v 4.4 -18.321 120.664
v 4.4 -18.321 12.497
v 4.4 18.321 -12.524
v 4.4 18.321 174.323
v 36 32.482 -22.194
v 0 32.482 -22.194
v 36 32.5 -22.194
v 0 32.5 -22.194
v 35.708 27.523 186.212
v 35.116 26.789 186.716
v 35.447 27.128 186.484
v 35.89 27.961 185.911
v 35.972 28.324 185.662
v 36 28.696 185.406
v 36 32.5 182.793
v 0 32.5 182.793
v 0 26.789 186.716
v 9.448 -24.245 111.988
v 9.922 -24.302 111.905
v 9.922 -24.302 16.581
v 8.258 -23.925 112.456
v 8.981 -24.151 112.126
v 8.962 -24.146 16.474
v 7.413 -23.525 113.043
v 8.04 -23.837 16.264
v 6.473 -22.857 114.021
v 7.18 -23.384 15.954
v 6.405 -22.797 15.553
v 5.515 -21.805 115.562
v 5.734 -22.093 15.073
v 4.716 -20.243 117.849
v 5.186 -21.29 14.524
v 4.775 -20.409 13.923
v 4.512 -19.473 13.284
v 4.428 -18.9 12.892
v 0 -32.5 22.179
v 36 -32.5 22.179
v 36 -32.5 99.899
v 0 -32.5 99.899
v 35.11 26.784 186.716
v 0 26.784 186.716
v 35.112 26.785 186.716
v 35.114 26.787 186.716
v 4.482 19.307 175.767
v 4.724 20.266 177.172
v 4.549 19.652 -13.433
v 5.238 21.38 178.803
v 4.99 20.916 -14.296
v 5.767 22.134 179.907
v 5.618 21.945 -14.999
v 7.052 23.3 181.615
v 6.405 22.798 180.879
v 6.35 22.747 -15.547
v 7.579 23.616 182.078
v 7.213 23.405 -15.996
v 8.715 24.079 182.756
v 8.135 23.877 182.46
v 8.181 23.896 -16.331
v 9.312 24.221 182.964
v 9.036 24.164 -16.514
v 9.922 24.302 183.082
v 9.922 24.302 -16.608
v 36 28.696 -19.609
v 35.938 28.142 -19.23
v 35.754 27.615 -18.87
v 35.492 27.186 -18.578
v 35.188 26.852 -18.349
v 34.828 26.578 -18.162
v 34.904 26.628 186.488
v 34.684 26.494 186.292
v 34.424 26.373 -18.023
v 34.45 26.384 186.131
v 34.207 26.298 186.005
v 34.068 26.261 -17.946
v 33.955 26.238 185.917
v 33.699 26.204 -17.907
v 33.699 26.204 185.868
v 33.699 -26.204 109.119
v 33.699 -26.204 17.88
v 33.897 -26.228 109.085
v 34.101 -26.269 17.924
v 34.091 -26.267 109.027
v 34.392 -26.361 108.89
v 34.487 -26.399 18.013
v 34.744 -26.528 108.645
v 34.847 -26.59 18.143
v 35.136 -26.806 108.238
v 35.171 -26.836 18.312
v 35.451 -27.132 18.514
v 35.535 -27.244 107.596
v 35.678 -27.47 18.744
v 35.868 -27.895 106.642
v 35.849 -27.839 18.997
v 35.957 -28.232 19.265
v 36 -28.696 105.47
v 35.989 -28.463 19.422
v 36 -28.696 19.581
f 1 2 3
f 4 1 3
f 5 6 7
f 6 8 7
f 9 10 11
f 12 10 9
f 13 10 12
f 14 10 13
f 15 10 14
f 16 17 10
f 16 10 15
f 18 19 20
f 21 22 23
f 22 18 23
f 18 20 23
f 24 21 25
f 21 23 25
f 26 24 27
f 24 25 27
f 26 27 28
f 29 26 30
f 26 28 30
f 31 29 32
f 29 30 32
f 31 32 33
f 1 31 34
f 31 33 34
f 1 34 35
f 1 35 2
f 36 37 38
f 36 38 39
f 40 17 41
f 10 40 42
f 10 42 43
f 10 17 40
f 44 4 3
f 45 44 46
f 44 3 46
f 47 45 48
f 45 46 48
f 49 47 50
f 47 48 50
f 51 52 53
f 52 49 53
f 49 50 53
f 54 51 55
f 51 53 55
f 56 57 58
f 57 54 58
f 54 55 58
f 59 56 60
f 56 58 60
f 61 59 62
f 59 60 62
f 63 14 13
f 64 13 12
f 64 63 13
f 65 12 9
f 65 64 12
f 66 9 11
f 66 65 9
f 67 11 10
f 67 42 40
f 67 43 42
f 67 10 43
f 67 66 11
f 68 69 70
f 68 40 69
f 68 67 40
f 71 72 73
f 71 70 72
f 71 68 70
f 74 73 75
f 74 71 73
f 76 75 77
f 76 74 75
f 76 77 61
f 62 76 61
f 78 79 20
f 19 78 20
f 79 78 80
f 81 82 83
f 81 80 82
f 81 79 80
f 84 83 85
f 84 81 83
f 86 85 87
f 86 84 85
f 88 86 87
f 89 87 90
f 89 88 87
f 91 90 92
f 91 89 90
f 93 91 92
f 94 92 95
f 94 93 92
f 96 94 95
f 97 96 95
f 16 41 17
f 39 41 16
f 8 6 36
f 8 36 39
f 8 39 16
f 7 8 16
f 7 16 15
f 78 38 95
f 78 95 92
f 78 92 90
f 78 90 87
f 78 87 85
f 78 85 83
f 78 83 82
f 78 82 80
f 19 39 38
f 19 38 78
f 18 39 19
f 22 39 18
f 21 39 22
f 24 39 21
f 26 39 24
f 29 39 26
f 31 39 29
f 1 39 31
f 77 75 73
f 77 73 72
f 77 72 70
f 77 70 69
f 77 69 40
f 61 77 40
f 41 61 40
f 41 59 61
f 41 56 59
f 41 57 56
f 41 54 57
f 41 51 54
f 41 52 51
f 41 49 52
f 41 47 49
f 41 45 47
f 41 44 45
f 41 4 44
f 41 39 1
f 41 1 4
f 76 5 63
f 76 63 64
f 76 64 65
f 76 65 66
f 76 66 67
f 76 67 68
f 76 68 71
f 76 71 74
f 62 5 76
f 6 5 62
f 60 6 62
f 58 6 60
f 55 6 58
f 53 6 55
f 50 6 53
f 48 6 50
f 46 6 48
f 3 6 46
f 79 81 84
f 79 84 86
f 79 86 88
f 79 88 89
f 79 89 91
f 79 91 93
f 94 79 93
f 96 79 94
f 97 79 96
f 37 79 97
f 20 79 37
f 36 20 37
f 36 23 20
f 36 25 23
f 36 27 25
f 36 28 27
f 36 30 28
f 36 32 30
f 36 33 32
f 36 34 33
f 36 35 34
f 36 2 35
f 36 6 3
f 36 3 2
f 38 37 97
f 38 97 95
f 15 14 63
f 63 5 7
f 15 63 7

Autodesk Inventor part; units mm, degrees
ref_plane "Начальная плоскость" through (0, 0, -22.1942) normal (0, 0, 1) x (1, 0, 0)
ref_plane "Конечная плоскость" through (0, 0, 186.7165) normal (0, 0, 1) x (1, 0, 0)
sketch "Эскиз" plane through (0, 0, 0) normal (0, 0, 1) x (1, 0, 0)
  line L0 (36, -32.5) -> (0, -32.5)
  line L1 (36, -32.5) -> (36, -28.696)
  line L2 (33.6994, -26.2039) -> (9.9215, -24.3017)
  line L3 (4.4, -18.3208) -> (4.4, 18.3208)
  line L4 (33.6994, 26.2039) -> (9.9215, 24.3017)
  line L5 (36, 28.696) -> (36, 32.5)
  line L6 (0, 32.5) -> (36, 32.5)
  line L7 (0, -32.5) -> (0, 32.5)
  arc A0 (4.4, -18.3208) -> (9.9215, -24.3017) centre (10.4, -18.3208) ccw
  arc A1 (9.9215, 24.3017) -> (4.4, 18.3208) centre (10.4, 18.3208) ccw
  arc A2 (36, -28.696) -> (33.6994, -26.2039) centre (33.5, -28.696) ccw
  arc A3 (33.6994, 26.2039) -> (36, 28.696) centre (33.5, 28.696) ccw
  line L8 (0, 45.5) -> (0, -45.5) construction
  line L9 (-7.2974, 0) -> (43.7847, 0) construction
  point P0 (36, -26.388)
  point P1 (4.4, -23.86)
  point P2 (4.4, 23.86)
  point P3 (36, 26.388)
  dimension "d3" = 36
  dimension "d5" = 4.4
  dimension "d7" = 65
  dimension "d9" = 8.64
  dimension "d11" = 8.64
  dimension "d13" = 6.112
  dimension "d15" = 6.112
  dimension "d22" = 6
  dimension "d23" = 2.5
  dimension "d24" = 32.5
  dimension "d25" = 0
extrude "Тело" add sketch "Эскиз" along normal up to surface (208.9107 mm away) from surface at -22.1942
sketch "Sketch3" plane through (0, 0, 0) normal (0, 0, 1) x (1, 0, 0)
  line L0 (0, 0) -> (10, 0)
ref_plane "Work Plane7" through (0, 0, 0) normal (0, -1, 0) x (1, 0, 0)
sketch "Sketch4" plane through (0, 0, 0) normal (0, -1, 0) x (1, 0, 0)
  line L0 (-2, -22.1942) -> (12, -22.1942)
  line L1 (-2, 186.7165) -> (12, 186.7165)
  dimension "d29" = 208.9107
ref_plane "РабПлоскость8" through (36, 0, 205.1172) normal (0, 0.5662, 0.8243) x (1, 0, 0)
split "Разделение1" plane through (36, 0, 205.1172) removes the side toward (0, 0.5662, 0.8243)
ref_plane "РабПлоскость9" through (0, -68.6864, 46.906) normal (0, -0.8258, 0.5639) x (1, 0, 0)
split "Разделение2" plane through (0, -68.6864, 46.906) removes the side toward (0, -0.8258, 0.5639)
ref_plane "РабПлоскость10" through (36, 299.1334, -204.2778) normal (0, -0.5639, -0.8258) x (1, 0, 0)
split "Разделение3" plane through (36, 299.1334, -204.2778) removes the side toward (0, -0.5639, -0.8258)
equation "\"d3\" = b"
equation "\"d5\" = t1"
equation "\"d7\" = ParH"
equation "\"d9\" = msp_x1 + t2"
equation "\"d11\" = msp_x1 + t2"
equation "\"d13\" = -msp_x2 + t2"
equation "\"d15\" = -msp_x2 + t2"
equation "\"d22\" = R"
equation "\"d23\" = R1"
equation "\"d24\" = 0.5 * d7"
equation "\"d16\" = G_L"
equation "\"R1\" = 2.5"
equation "\"R\" = 6"
equation "\"t1\" = 4.4"
equation "\"t2\" = 7.2"
equation "\"ParH\" = 65"
equation "\"b\" = 36"
equation "\"msp_x1\" = 0.04 * b"
equation "\"msp_x2\" = -0.08 * t1 + 0.04 * b"
equation "\"G_L\" = d29"
equation "\"ex\" = 0"
equation "\"G_OFFSET_START\" = 22.1942"
equation "\"G_OFFSET_END\" = -18.40074"
equation "\"d26\" = -G_OFFSET_START"
equation "\"d27\" = G_OFFSET_END + B_L"
equation "\"B_L\" = 205.11724"
properties part number "Швеллер 6.5U-208,91 ГОСТ 8240-97" material "Сталь, мягкая"
